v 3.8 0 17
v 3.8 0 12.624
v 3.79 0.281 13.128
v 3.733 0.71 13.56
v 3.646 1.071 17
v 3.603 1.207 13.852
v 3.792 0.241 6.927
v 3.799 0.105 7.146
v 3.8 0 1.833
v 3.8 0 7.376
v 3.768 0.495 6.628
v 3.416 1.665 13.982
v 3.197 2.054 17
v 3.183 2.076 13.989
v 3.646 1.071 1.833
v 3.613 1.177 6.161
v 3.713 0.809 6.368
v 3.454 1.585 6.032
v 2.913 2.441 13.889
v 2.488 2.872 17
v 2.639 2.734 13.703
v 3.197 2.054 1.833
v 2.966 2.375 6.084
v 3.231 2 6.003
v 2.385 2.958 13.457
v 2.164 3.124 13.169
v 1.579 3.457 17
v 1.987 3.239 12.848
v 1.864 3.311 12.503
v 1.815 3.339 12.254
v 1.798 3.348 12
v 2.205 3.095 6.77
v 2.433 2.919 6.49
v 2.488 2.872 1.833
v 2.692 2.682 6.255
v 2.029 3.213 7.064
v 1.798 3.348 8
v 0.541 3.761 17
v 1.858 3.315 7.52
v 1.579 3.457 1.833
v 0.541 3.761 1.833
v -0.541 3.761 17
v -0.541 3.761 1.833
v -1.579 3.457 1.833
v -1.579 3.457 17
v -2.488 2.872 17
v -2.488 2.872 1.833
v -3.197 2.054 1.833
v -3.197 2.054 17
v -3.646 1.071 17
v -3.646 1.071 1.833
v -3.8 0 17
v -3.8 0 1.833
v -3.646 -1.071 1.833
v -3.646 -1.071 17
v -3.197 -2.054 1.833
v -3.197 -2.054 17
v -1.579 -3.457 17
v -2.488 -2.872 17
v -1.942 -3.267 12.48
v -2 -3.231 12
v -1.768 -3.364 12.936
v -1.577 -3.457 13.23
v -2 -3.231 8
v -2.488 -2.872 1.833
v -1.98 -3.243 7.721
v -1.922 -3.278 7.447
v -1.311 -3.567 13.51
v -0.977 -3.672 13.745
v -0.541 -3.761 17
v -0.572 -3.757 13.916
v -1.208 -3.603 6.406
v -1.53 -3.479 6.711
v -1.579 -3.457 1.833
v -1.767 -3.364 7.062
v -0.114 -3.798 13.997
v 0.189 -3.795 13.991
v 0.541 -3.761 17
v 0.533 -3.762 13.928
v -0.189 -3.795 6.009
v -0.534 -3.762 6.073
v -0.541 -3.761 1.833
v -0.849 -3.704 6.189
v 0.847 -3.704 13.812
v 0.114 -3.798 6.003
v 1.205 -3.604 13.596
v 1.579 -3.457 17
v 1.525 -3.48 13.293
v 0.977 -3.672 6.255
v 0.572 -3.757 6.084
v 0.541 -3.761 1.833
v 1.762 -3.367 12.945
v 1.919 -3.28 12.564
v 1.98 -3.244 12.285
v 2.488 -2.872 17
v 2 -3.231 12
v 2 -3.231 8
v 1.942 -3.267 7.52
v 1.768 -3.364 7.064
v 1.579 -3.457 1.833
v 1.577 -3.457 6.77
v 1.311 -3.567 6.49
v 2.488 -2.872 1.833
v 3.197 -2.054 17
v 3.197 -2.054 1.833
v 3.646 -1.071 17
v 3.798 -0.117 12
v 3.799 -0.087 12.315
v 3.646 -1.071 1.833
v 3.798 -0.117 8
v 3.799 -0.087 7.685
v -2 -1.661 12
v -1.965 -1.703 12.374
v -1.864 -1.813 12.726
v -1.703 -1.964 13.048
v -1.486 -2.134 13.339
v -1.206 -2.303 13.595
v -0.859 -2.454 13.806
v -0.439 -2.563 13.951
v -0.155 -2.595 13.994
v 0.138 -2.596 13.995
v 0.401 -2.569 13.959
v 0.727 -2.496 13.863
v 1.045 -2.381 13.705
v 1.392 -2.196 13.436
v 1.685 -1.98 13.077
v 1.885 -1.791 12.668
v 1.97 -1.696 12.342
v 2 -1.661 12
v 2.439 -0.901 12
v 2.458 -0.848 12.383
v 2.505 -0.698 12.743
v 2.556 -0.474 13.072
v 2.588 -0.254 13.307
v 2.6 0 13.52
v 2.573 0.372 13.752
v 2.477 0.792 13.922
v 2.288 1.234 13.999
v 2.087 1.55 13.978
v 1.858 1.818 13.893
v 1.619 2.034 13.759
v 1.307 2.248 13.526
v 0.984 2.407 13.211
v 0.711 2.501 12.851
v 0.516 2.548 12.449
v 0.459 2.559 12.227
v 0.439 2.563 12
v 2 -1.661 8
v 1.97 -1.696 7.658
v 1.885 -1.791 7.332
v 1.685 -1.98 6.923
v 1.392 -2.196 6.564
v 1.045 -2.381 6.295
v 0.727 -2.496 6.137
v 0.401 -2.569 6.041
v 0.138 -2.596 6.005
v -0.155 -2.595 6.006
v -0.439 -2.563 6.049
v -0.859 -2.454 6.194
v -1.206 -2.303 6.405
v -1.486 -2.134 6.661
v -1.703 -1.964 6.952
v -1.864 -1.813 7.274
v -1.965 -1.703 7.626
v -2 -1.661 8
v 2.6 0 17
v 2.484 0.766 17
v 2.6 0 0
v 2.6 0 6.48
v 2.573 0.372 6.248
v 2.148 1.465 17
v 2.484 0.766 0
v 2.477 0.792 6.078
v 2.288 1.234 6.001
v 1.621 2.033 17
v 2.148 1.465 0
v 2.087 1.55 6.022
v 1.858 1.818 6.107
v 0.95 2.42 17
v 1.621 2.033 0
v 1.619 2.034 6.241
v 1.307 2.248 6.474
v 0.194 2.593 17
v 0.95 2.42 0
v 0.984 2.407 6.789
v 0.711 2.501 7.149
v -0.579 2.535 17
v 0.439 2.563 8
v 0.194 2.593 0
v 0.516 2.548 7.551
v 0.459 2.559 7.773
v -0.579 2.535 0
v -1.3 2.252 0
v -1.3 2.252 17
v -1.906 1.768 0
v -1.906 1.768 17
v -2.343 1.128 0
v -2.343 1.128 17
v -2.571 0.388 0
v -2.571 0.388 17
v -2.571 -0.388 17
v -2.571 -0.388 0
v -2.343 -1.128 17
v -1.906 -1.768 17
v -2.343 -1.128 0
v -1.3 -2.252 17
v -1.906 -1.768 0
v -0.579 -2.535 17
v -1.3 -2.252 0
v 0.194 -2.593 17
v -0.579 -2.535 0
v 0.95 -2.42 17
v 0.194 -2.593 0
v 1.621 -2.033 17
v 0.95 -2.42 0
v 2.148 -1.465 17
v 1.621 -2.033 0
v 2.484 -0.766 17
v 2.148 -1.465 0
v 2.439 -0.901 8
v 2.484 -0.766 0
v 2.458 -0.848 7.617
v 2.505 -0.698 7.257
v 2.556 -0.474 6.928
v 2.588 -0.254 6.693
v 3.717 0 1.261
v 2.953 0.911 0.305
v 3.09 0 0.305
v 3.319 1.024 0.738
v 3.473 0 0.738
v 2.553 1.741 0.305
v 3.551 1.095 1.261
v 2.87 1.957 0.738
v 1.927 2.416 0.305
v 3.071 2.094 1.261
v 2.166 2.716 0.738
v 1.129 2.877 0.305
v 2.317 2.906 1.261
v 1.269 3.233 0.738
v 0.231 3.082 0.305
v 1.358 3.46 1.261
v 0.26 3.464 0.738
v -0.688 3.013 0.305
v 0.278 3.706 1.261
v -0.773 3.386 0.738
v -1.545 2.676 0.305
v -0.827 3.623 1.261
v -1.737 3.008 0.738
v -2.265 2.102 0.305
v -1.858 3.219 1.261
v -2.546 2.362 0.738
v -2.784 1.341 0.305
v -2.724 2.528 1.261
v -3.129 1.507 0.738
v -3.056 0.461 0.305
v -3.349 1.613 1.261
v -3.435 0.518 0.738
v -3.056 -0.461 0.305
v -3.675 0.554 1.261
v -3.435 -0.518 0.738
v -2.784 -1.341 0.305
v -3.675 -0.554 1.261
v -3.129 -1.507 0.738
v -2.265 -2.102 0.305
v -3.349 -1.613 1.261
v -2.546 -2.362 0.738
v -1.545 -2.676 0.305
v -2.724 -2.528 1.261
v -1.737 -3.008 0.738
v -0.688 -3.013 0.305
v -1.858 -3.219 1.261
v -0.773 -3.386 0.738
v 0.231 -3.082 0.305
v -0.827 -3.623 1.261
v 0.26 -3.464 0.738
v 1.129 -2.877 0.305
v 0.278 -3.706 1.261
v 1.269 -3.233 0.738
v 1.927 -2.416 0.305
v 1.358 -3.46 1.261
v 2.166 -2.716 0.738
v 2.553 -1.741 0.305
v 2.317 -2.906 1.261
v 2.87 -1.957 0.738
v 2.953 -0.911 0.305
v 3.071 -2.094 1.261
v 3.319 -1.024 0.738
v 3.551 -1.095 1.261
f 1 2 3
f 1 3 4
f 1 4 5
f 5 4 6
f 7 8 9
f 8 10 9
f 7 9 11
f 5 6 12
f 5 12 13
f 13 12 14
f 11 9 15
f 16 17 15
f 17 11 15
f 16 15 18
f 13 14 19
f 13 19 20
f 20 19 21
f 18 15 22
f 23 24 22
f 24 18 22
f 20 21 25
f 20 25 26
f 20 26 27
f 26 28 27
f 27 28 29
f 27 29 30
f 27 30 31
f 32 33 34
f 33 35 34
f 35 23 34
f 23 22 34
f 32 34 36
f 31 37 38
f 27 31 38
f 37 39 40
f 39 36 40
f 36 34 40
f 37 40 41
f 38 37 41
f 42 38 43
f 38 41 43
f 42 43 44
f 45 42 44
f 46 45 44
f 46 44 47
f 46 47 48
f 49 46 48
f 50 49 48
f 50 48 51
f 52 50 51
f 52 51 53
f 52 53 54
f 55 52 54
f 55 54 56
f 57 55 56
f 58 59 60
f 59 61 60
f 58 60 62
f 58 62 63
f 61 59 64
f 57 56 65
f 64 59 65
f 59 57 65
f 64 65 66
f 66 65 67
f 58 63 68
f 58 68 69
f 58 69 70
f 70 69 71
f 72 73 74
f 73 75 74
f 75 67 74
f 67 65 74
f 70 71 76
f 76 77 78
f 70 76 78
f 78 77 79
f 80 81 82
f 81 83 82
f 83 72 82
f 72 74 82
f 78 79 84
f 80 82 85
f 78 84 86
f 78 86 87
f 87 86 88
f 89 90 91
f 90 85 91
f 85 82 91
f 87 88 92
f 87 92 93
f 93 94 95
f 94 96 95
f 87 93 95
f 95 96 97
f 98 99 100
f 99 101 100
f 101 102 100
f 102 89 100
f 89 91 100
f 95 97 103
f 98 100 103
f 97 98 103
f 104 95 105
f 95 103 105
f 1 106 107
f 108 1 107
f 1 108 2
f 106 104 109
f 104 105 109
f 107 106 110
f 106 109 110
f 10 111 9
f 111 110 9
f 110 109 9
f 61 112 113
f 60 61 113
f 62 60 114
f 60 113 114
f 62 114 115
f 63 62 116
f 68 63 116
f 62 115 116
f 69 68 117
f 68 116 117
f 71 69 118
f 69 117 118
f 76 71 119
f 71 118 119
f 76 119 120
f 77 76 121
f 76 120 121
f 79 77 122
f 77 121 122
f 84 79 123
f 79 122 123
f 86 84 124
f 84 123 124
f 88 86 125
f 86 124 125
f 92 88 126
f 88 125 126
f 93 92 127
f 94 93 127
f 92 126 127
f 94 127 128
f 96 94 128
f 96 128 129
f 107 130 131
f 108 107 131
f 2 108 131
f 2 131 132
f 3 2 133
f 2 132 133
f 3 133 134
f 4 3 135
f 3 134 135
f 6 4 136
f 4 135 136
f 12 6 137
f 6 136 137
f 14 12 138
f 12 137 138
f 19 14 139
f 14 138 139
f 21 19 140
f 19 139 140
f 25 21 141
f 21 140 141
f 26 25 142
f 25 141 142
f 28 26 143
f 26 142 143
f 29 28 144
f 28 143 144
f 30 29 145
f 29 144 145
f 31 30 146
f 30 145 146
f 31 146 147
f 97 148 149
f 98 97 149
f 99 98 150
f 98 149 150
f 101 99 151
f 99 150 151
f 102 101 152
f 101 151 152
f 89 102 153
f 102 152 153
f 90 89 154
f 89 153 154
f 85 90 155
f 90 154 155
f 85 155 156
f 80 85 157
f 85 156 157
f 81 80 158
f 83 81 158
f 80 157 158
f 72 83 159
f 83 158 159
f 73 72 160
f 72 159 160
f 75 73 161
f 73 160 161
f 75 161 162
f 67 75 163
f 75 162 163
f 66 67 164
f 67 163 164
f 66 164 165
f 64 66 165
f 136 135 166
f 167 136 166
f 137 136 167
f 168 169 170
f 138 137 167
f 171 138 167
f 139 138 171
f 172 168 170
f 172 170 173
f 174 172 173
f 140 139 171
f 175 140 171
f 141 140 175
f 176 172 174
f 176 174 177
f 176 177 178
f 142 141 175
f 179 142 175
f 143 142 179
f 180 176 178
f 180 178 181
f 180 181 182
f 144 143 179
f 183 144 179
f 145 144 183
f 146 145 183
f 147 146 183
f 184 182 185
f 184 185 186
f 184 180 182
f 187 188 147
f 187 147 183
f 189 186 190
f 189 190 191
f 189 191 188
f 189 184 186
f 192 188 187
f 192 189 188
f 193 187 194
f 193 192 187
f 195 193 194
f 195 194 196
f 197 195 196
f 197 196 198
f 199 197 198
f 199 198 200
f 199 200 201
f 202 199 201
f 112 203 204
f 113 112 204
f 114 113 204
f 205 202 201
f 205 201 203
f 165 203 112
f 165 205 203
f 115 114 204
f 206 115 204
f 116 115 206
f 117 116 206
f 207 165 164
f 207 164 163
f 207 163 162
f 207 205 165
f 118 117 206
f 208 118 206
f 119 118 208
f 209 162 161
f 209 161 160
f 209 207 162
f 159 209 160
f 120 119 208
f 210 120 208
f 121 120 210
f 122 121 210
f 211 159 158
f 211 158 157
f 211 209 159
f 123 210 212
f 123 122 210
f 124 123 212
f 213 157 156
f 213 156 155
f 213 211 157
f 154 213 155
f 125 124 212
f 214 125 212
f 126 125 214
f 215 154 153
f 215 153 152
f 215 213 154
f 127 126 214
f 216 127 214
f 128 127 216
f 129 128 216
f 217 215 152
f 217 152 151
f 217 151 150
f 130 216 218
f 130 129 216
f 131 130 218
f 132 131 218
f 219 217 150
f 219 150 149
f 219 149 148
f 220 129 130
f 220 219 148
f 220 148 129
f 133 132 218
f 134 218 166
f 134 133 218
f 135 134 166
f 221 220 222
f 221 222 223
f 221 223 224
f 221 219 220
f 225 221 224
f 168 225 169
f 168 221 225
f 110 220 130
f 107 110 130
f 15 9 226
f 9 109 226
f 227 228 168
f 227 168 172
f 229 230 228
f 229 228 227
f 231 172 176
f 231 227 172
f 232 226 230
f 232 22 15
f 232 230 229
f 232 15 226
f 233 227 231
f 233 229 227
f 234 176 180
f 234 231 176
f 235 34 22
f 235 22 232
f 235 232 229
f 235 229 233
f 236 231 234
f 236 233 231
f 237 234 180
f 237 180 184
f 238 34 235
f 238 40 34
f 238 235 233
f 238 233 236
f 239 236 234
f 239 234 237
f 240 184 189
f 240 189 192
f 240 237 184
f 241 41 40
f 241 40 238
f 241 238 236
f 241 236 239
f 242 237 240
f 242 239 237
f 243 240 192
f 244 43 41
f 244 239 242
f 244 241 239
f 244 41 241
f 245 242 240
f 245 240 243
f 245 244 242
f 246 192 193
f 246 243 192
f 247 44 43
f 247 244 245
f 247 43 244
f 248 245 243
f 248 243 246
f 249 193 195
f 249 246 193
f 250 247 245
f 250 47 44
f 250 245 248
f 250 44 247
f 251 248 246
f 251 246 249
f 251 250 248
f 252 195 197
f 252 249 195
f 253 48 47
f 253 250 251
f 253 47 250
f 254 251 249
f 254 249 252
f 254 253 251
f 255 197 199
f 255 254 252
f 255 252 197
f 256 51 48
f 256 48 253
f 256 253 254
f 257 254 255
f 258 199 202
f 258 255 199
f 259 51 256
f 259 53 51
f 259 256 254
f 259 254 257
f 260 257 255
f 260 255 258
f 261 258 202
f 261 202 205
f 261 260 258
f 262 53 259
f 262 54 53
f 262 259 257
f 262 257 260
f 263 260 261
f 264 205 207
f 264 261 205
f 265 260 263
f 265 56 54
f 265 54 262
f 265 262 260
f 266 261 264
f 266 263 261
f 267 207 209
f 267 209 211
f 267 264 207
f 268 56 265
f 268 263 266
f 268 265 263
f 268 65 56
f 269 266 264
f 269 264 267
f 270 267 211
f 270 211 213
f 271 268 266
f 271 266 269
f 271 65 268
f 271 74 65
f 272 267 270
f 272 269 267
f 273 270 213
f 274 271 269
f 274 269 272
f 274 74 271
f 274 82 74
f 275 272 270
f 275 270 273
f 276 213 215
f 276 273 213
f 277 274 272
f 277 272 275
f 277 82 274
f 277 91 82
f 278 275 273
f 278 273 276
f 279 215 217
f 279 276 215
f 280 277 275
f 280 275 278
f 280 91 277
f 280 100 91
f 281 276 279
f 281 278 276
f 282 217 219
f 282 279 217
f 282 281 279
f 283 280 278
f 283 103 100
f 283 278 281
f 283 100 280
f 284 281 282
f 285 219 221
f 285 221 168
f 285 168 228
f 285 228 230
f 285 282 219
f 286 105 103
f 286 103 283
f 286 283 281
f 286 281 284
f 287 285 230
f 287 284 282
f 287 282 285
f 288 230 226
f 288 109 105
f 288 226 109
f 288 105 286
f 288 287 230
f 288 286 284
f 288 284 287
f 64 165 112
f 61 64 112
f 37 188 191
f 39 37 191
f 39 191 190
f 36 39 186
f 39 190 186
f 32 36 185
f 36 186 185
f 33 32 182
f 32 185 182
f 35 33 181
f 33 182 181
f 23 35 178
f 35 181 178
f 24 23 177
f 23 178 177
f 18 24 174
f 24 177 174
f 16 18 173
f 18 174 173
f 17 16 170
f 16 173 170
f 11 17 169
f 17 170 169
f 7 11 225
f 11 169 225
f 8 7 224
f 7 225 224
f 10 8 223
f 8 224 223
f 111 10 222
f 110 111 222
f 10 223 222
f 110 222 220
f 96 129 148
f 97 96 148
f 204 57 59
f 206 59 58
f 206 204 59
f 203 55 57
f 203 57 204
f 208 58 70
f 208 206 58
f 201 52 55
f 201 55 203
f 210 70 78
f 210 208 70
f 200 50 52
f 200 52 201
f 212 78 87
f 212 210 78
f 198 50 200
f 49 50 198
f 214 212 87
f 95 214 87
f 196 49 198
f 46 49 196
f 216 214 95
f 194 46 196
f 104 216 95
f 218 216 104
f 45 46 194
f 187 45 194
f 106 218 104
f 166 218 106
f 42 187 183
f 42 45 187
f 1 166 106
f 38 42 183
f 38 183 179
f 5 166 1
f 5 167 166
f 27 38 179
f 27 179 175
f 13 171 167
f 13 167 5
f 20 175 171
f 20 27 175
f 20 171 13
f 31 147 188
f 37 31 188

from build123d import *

# Parameters (mm, degrees)
SKETCH_1_R               = 3.8
SKETCH_1_R_2             = 2.6
EXTRUDE_1_DEPTH          = 17
CUT_EXTRUDE_1_DEPTH      = 17
PATTERN_CIRCULAR_1_COUNT = 2
PATTERN_CIRCULAR_1_ANGLE = 120
FILLET_1_R               = 2


with BuildPart() as part:
    # 스케치1 → 보스-돌출1 (new body)
    with BuildSketch(Plane.XY):
        Circle(SKETCH_1_R)
        Circle(SKETCH_1_R_2, mode=Mode.SUBTRACT)
    extrude(amount=EXTRUDE_1_DEPTH)

    # 스케치2 → 컷-돌출1 (cut)
    with BuildSketch(Plane(origin=(0, 0, 0), x_dir=(1, 0, 0), z_dir=(0, 1, 0))):
        with BuildLine():
            Line((-2, -8), (-2, -12))
            ThreePointArc((-2, -12), (0, -14), (2, -12))
            Line((2, -12), (2, -8))
            ThreePointArc((2, -8), (0, -6), (-2, -8))
        make_face()
    cut_extrude_1 = extrude(amount=-CUT_EXTRUDE_1_DEPTH, mode=Mode.SUBTRACT)

    # 원형 패턴1: 컷-돌출1 ×2 about axis
    pattern_circular_1_axis = Axis((0, 0, 0), (0, 0, 1))
    for i in range(1, PATTERN_CIRCULAR_1_COUNT):
        add(cut_extrude_1.rotate(pattern_circular_1_axis, i * PATTERN_CIRCULAR_1_ANGLE / (PATTERN_CIRCULAR_1_COUNT - 1)), mode=Mode.SUBTRACT)

    # 필렛1
    # the kernel refuses this fillet: 2 mm, written as the material it takes off along each edge
    with BuildSketch(Plane(origin=(0, 0, 0), x_dir=(1, 0, 0), z_dir=(0, -1, 0))) as fillet_1_piece_1:
        with BuildLine():
            CenterArc((1.8, 1.833030278), FILLET_1_R, 293.578178478, 66.421821522)
            Line((2.6, 0), (2.616, -0.036660606))
            ThreePointArc((2.616, -0.036660606), (3.2, -0.04), (3.8, -0.04))
            Line((3.8, -0.04), (3.84, 0))
            Line((3.84, 0), (3.84, 1.833030278))
            Line((3.84, 1.833030278), (3.8, 1.833030278))
        make_face()
    revolve(axis=Axis((0, 0, 0), (0, 0, 1)), mode=Mode.SUBTRACT)


solid = part.part
